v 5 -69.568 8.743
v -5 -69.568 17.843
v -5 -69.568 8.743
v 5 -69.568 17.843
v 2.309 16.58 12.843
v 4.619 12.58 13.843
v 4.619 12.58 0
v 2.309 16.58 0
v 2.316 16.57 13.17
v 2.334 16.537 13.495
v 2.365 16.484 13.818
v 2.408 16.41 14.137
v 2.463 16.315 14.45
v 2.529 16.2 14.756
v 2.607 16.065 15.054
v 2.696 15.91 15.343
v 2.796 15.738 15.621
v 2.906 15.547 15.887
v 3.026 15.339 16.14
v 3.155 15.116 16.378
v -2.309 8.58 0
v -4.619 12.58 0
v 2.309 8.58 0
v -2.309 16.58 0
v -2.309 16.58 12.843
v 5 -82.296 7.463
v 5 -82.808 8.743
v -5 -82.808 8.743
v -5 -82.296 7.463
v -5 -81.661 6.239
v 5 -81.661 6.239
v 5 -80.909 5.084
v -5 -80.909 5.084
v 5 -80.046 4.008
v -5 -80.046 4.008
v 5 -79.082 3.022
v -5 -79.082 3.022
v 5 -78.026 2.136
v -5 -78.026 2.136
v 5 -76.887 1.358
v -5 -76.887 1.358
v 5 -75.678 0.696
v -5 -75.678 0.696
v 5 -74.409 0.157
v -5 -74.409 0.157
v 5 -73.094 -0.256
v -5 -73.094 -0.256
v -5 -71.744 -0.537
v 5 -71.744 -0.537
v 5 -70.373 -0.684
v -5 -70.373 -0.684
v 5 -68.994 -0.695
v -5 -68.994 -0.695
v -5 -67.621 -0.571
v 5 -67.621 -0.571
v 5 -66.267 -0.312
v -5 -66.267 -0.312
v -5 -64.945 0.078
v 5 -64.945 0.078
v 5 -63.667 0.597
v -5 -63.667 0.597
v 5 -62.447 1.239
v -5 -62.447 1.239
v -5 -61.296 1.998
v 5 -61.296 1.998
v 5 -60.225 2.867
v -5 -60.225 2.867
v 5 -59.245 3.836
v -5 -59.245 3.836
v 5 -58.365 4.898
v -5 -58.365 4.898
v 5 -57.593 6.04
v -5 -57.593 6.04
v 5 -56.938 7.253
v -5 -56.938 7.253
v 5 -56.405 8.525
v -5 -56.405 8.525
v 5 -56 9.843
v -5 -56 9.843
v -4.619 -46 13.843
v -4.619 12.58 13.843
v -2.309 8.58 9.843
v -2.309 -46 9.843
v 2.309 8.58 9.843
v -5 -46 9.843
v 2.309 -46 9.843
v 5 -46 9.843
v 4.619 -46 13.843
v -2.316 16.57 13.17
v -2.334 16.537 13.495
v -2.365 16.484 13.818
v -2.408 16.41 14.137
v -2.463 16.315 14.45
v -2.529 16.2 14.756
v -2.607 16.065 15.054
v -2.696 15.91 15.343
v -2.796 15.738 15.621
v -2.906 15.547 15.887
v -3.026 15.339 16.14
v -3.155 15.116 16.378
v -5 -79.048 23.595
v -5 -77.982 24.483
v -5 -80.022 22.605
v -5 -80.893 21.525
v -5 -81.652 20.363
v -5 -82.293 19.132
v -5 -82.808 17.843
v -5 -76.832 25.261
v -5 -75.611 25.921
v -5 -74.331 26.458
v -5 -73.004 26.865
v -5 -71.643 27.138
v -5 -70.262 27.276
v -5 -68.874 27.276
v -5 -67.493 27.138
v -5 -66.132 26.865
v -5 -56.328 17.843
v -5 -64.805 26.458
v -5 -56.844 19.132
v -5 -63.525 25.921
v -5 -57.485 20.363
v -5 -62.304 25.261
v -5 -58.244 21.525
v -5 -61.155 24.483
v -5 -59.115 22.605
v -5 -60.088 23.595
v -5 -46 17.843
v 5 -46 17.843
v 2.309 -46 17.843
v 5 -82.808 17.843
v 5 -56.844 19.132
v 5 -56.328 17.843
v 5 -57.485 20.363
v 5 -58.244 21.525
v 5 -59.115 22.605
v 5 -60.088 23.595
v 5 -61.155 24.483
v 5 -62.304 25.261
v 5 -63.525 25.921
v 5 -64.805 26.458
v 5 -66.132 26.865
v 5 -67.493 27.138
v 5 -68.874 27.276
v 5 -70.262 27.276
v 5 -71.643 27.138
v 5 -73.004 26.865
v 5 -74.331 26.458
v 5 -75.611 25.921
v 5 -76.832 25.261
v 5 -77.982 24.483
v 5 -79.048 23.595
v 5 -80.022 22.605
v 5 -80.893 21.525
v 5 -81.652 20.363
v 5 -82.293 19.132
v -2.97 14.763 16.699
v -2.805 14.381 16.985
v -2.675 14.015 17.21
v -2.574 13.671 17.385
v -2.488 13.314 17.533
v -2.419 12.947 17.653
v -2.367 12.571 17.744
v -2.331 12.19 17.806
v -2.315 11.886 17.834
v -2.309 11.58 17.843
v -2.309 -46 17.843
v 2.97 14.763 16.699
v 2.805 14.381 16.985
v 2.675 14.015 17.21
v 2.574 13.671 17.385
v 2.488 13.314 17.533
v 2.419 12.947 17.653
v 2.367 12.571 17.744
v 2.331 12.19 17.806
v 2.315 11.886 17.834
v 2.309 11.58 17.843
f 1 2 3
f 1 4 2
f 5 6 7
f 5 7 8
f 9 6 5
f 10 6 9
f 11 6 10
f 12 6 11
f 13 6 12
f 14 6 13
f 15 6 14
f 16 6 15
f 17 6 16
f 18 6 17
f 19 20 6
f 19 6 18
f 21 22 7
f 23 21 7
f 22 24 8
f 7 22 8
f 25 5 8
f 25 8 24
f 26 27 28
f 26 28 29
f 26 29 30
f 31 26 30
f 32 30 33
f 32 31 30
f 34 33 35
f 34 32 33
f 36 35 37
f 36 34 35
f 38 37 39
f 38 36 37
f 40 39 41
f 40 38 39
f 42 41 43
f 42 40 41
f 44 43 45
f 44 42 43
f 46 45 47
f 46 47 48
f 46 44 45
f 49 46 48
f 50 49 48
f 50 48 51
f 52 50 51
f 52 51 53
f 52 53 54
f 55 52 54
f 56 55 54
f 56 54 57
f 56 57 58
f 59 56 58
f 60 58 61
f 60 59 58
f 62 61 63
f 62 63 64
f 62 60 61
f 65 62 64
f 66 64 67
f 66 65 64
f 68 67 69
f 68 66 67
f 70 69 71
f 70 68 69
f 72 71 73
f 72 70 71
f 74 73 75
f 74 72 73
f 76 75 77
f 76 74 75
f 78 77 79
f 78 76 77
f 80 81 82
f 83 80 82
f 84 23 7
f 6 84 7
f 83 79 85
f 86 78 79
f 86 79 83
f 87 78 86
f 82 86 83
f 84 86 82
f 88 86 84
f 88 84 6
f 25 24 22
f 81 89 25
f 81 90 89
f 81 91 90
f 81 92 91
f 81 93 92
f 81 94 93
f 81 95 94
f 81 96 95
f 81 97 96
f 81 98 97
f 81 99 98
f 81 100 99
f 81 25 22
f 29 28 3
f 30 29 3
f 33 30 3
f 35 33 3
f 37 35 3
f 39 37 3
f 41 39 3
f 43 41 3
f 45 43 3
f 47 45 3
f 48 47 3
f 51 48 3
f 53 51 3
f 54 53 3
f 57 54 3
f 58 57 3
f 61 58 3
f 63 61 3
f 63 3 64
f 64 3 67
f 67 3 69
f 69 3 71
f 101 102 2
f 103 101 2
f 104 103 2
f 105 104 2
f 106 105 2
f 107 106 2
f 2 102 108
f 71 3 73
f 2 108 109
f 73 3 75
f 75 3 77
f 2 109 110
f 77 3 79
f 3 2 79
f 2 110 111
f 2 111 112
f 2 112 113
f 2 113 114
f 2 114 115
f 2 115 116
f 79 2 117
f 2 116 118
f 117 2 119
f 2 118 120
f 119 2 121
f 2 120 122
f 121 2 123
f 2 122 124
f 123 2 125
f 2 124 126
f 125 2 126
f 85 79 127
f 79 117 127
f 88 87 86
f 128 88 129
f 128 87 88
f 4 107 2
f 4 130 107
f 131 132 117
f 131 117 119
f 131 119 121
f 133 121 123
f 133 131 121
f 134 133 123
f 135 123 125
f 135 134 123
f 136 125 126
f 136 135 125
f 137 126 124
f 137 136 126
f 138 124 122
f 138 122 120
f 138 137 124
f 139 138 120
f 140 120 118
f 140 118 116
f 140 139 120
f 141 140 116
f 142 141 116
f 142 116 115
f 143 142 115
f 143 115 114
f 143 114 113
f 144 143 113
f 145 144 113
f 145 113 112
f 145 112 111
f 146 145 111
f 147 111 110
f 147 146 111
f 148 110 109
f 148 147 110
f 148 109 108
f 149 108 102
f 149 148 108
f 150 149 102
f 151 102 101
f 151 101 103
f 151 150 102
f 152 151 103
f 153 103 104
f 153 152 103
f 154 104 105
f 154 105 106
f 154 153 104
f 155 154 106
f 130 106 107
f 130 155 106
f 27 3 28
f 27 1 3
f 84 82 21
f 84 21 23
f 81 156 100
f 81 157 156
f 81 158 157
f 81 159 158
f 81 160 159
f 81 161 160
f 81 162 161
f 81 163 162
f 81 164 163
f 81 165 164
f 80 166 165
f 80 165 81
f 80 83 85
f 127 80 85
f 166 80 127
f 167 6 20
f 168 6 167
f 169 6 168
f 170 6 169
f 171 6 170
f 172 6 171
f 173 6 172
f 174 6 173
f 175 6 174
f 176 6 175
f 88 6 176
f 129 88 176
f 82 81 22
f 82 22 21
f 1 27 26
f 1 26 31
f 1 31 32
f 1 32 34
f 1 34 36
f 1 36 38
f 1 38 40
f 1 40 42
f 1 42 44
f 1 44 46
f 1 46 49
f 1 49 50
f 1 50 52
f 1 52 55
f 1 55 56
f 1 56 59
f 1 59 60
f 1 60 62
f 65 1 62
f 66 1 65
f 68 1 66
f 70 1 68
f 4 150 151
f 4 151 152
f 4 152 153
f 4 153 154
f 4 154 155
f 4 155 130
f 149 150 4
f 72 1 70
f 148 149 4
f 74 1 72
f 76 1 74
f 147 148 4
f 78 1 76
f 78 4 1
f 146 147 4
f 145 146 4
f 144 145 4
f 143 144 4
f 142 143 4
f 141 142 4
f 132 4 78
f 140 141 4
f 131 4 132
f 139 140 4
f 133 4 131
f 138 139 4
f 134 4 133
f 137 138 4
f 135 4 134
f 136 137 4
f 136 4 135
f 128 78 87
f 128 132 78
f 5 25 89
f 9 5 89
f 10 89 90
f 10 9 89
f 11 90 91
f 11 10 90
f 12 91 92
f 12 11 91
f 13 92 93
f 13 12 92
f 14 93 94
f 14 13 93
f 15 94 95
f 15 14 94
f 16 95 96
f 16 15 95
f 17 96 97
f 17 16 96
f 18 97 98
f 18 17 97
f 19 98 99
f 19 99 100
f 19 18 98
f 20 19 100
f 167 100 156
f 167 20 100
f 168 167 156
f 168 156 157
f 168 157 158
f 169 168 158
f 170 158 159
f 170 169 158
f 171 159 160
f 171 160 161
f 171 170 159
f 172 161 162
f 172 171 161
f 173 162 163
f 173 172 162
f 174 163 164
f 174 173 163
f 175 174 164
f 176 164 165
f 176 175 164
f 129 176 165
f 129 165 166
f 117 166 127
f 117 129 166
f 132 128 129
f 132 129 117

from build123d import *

# Parameters (mm, degrees)
F3_R     = 5
F5_DEPTH = 5


with BuildPart() as f2:
    # F2: sweep along a path in F1
    with BuildLine(Plane.YZ) as f2_path:
        Line((13.7373713946, 0), (13.7373713946, 15))
        Line((13.7373713946, 15), (-46.2626286054, 15))
    # F0 (on Top) → F2 (sweep)
    with BuildSketch(Plane.XY):
        Polygon((-2.3094010768, 16.5802386344), (-4.6188021535, 12.5802386344), (-2.3094010768, 8.5802386344), (2.3094010768, 8.5802386344), (4.6188021535, 12.5802386344), (2.3094010768, 16.5802386344), align=None)
    sweep(path=f2_path.line, transition=Transition.RIGHT)

    # F3
    f3_edges = [f2.edges().sort_by_distance(p)[0] for p in [
        (0, 16.580239, 17.842867),
    ]]
    fillet(f3_edges, radius=F3_R)

    # F4 (on Right) → F5 (join, symmetric)
    with BuildSketch(Plane.YZ):
        with BuildLine():
            Line((-69.568253388, 8.7428672398), (-82.8082496115, 8.7428672398))
            ThreePointArc((-82.8082496115, 8.7428672398), (-68.9942863231, -0.6953621624), (-56, 9.8428672398))
            Line((-56, 9.8428672398), (-46, 9.8428672398))
            Line((-46, 9.8428672398), (-46, 17.8428672398))
            Line((-46, 17.8428672398), (-56.3282571644, 17.8428672398))
            ThreePointArc((-56.3282571644, 17.8428672398), (-69.568253388, 27.2928672398), (-82.8082496115, 17.8428672398))
            Line((-82.8082496115, 17.8428672398), (-69.568253388, 17.8428672398))
            Line((-69.568253388, 17.8428672398), (-69.568253388, 8.7428672398))
        make_face()
    extrude(amount=F5_DEPTH, both=True)


solid = f2.part
